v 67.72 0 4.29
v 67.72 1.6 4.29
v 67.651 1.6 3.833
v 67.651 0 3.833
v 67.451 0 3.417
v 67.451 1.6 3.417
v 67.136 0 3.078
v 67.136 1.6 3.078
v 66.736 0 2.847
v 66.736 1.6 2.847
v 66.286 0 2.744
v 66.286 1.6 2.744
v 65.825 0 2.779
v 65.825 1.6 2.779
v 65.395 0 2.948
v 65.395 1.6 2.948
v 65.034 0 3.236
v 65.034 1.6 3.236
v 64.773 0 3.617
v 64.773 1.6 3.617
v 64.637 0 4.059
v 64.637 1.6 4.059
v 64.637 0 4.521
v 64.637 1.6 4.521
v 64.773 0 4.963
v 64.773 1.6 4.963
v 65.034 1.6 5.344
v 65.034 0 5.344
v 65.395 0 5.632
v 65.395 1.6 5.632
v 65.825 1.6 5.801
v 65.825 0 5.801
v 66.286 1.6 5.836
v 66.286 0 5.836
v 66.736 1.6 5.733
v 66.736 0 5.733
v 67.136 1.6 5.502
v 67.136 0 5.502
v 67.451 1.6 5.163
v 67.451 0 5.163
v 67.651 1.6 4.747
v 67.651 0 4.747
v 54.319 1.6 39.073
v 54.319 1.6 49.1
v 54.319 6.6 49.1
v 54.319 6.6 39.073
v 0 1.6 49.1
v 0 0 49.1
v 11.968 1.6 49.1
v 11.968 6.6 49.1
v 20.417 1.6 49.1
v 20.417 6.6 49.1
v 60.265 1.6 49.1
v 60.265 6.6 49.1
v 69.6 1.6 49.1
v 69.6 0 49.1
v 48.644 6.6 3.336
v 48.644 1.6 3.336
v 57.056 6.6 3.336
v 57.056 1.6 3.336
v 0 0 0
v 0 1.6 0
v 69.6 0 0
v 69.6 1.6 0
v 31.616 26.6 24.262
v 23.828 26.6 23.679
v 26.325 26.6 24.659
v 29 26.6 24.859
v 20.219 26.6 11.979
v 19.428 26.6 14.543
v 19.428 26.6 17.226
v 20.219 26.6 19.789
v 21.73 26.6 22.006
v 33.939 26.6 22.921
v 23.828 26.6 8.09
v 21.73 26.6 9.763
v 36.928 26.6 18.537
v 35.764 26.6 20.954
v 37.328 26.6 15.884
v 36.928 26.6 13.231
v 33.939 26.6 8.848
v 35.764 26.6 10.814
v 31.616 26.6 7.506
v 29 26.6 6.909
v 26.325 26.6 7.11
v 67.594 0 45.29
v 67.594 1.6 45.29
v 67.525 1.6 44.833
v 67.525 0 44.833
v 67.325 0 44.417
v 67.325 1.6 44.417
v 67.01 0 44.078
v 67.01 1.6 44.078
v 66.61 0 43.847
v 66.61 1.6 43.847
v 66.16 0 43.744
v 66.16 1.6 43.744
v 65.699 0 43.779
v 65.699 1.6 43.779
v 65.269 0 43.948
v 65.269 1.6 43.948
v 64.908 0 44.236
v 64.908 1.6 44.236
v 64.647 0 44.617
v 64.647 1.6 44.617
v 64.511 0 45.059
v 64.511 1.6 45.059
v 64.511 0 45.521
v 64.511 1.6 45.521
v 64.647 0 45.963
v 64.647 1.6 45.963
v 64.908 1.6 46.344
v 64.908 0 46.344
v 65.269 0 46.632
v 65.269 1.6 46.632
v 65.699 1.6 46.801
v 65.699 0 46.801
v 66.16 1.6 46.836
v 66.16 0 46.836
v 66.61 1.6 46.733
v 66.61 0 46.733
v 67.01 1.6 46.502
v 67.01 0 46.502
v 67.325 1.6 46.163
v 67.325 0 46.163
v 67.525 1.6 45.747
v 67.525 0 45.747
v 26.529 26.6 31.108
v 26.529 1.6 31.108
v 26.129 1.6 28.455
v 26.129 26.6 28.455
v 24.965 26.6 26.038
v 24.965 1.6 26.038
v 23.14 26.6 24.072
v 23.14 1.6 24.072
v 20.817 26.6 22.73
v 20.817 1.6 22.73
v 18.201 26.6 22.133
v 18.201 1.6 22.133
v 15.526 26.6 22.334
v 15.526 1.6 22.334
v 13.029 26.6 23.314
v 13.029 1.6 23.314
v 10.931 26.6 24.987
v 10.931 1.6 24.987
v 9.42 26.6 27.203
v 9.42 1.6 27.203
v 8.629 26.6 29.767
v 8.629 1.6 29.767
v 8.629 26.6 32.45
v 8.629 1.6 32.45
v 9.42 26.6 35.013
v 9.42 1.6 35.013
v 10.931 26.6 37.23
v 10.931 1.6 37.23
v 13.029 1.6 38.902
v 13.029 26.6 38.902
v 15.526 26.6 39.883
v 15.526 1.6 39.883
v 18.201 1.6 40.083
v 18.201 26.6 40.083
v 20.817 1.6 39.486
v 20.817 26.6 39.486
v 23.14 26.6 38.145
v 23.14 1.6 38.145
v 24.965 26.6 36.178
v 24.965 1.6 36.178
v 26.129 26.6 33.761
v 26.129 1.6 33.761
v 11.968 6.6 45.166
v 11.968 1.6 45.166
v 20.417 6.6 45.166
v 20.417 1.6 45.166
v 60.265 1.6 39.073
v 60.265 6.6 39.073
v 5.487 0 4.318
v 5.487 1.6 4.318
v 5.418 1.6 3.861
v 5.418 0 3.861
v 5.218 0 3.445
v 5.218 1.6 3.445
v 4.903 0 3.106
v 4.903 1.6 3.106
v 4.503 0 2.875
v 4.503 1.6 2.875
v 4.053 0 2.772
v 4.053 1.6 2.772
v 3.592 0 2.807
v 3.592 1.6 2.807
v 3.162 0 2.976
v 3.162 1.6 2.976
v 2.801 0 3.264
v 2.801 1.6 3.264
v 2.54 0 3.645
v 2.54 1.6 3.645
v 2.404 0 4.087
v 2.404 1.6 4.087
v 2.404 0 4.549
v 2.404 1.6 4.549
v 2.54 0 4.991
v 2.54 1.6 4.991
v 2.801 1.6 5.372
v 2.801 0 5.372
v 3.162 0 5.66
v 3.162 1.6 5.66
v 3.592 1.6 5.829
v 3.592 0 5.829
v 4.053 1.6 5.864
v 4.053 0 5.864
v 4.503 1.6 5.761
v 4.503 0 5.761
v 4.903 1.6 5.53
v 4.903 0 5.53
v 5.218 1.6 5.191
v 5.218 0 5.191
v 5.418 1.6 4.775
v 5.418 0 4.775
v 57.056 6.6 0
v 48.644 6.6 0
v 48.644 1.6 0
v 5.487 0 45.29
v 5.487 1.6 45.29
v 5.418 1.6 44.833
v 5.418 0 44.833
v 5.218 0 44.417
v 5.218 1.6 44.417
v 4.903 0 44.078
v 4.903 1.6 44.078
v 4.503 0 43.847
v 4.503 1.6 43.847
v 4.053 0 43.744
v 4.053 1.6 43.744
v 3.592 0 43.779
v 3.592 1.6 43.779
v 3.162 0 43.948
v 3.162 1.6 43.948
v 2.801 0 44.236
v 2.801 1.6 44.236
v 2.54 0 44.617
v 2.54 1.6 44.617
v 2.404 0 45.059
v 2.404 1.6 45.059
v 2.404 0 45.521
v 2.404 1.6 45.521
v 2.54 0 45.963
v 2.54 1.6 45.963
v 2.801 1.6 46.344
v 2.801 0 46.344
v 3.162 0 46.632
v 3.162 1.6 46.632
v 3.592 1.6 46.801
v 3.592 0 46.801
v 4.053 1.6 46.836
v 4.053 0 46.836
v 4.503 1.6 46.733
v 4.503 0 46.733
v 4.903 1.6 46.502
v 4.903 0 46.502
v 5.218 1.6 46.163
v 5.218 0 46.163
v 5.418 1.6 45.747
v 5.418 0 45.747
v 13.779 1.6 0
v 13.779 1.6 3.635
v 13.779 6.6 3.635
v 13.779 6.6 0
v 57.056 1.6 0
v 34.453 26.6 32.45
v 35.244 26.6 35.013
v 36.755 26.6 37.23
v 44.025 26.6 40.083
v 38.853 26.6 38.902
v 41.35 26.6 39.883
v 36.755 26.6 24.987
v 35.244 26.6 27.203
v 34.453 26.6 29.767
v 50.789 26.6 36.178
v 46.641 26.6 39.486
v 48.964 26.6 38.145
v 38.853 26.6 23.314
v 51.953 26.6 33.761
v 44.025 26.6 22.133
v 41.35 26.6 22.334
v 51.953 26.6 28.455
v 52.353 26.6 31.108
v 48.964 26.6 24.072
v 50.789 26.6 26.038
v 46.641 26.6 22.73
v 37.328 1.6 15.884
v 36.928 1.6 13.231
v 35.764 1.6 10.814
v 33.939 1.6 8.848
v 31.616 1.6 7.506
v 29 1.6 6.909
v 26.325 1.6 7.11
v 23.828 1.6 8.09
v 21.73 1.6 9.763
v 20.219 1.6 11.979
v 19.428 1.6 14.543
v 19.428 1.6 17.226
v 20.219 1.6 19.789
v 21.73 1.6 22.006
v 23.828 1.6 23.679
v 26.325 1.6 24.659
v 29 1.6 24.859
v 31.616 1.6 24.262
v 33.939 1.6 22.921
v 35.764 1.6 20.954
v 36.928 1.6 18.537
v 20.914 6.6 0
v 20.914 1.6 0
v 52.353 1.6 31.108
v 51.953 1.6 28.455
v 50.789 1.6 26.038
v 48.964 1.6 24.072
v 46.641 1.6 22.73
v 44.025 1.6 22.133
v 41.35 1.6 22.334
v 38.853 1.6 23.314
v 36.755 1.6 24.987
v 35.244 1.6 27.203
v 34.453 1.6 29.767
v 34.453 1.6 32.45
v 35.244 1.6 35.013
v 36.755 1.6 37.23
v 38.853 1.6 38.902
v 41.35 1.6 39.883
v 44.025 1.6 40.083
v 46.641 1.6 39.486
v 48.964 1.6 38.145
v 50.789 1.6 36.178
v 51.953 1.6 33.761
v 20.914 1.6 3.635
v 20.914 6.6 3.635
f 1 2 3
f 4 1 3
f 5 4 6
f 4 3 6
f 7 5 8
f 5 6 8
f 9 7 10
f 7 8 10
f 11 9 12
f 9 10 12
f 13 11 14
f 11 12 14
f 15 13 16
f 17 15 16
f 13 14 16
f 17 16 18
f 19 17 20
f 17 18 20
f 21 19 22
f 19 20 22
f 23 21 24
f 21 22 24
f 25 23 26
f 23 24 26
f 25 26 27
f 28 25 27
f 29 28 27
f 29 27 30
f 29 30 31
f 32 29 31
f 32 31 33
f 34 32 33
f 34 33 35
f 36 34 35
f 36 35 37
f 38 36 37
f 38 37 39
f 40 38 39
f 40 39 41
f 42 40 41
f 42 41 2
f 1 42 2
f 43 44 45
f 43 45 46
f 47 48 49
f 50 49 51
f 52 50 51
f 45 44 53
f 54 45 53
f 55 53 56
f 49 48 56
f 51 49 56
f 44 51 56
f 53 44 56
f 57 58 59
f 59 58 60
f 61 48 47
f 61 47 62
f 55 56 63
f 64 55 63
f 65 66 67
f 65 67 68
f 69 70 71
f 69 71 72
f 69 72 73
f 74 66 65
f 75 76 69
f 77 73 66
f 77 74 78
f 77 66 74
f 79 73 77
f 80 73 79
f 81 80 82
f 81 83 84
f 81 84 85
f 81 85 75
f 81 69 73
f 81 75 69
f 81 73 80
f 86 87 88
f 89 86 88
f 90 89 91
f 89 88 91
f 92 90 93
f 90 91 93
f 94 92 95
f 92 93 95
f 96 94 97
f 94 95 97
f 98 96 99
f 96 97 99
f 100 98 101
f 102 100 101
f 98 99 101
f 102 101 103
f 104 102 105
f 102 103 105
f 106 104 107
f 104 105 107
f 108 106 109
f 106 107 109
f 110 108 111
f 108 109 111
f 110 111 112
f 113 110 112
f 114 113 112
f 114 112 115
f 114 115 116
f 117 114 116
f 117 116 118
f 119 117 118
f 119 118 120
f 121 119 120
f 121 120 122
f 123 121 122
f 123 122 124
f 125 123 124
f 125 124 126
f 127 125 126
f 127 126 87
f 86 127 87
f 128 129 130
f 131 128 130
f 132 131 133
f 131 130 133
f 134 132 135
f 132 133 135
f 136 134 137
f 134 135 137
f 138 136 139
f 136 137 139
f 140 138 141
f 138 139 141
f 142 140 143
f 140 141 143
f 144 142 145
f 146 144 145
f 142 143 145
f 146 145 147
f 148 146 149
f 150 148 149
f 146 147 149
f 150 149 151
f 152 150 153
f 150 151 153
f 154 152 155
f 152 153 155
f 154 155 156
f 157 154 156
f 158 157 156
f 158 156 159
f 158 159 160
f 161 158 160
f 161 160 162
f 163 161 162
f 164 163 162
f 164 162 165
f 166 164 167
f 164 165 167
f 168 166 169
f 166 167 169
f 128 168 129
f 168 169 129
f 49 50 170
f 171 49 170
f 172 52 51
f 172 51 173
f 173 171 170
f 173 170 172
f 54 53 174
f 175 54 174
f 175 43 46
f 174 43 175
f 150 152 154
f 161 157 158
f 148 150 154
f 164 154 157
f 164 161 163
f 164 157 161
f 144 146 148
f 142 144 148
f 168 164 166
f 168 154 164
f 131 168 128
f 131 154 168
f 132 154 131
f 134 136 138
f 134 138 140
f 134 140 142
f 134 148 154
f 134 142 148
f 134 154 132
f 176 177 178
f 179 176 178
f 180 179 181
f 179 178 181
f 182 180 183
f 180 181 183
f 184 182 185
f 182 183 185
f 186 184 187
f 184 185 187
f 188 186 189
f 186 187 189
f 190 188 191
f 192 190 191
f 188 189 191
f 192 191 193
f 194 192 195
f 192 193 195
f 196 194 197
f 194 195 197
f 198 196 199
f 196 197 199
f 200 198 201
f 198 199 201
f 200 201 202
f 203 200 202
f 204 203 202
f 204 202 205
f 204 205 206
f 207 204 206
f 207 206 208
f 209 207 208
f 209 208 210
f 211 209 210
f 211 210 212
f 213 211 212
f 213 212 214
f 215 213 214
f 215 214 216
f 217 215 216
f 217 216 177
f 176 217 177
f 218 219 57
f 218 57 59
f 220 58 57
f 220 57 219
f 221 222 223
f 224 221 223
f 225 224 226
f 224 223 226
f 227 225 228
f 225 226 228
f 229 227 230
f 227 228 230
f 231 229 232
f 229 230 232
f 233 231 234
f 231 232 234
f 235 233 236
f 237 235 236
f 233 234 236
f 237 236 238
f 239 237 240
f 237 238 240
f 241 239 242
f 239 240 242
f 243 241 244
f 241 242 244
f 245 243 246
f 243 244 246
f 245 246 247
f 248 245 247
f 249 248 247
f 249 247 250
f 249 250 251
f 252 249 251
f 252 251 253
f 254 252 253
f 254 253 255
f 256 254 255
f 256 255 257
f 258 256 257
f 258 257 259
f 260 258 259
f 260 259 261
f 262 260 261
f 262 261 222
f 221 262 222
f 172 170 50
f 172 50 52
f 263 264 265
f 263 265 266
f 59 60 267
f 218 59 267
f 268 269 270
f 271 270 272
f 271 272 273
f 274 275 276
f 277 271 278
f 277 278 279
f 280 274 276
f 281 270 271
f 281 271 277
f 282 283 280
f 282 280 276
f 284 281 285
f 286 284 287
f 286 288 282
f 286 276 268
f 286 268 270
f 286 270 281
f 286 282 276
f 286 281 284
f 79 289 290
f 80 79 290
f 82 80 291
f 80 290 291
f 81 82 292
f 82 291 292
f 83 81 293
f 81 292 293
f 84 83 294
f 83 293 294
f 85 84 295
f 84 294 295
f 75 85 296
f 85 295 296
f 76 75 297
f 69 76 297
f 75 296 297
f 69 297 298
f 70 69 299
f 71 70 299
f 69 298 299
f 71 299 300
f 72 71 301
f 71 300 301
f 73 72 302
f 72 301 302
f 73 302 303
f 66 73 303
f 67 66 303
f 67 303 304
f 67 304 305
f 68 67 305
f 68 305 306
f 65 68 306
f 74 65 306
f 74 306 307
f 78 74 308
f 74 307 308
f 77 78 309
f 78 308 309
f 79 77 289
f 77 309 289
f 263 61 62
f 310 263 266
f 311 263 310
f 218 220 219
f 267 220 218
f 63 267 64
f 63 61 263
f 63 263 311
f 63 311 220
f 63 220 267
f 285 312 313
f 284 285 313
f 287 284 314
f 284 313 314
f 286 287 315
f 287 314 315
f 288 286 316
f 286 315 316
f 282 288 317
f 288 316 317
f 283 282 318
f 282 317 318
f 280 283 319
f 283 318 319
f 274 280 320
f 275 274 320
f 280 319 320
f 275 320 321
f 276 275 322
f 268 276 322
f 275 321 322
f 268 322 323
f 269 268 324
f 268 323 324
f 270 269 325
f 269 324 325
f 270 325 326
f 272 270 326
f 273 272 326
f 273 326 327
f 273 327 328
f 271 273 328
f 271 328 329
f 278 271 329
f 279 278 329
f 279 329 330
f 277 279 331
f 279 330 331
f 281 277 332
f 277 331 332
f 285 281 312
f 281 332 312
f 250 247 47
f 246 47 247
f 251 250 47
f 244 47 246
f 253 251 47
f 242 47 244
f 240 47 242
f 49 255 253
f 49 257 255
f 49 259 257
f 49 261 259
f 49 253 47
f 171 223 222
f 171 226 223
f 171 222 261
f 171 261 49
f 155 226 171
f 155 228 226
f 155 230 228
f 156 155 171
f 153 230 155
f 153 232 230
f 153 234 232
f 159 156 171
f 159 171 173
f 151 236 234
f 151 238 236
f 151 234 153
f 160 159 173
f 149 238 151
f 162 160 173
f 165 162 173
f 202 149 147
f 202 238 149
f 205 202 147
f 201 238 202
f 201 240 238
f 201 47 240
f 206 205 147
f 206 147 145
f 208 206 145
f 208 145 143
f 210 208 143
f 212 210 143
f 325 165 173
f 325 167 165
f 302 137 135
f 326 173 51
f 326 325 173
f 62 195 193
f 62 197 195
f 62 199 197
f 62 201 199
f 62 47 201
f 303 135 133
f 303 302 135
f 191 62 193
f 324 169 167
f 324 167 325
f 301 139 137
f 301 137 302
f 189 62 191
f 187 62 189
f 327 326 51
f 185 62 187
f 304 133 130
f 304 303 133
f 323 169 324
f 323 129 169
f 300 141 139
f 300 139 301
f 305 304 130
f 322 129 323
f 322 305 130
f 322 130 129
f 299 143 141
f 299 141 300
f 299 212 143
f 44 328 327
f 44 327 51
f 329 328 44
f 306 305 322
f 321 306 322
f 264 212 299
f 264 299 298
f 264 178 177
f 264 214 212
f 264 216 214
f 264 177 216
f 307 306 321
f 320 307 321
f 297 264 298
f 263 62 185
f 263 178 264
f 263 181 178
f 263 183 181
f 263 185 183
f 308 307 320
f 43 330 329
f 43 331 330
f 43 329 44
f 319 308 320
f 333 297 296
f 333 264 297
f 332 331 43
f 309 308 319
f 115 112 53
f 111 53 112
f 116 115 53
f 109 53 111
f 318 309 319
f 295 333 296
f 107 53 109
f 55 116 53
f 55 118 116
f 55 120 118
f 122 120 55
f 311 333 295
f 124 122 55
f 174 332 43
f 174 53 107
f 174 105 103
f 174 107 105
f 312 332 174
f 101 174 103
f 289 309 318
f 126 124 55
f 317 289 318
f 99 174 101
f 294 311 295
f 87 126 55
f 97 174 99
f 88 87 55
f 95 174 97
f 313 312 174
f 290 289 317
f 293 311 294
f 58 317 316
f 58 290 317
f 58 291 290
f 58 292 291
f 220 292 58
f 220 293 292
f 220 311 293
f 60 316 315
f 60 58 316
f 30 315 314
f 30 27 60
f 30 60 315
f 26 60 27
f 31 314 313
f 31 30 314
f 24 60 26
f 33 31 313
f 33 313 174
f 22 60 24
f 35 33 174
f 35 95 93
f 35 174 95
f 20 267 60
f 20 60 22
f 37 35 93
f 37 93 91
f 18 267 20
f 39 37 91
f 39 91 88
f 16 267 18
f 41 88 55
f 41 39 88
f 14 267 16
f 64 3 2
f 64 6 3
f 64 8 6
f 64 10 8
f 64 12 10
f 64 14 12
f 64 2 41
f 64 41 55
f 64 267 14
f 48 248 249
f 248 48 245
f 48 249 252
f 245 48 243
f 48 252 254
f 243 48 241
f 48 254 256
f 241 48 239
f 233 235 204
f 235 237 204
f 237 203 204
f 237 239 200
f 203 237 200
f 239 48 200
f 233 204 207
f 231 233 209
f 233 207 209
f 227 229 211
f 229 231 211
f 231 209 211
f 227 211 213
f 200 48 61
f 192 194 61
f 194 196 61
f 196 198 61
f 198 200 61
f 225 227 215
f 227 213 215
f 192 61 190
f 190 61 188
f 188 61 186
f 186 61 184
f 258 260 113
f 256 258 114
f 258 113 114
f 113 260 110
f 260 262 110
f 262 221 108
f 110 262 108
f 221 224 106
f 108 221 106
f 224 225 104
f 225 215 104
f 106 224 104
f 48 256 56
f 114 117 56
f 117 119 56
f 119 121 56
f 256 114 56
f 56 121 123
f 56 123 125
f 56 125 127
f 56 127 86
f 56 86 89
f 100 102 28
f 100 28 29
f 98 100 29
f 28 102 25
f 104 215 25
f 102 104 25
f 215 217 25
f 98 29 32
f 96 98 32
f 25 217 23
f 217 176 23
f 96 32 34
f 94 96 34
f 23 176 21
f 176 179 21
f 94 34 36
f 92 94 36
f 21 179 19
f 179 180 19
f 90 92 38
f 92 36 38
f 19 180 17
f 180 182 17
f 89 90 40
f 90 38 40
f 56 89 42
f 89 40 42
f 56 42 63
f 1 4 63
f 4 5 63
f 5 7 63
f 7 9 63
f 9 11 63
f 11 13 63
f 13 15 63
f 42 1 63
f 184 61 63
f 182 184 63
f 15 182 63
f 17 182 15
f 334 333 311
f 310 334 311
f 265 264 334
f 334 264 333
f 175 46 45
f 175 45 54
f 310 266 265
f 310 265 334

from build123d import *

# Parameters (mm, degrees)
SKETCH1_W           = 69.6
SKETCH1_H           = 49.1
BOSS_EXTRUDE1_DEPTH = 1.6
SKETCH2_R           = 9
BOSS_EXTRUDE2_DEPTH = 25
SKETCH3_R           = 1.55
CUT_EXTRUDE1_DEPTH  = 2.6
SKETCH4_W           = 7.135274134
SKETCH4_H           = 3.634808115
SKETCH4_W_2         = 8.411757442
SKETCH4_H_2         = 3.336029474
SKETCH4_W_3         = 8.448874517
SKETCH4_H_3         = 3.933927867
SKETCH4_W_4         = 5.945259598
SKETCH4_H_4         = 10.026659932
BOSS_EXTRUDE3_DEPTH = 5


with BuildPart() as part:
    # Sketch1 → Boss-Extrude1 (new body)
    with BuildSketch(Plane(origin=(0, 0, 0), x_dir=(1, 0, 0), z_dir=(0, 1, 0))):
        with Locations((34.8, -24.55)):
            Rectangle(SKETCH1_W, SKETCH1_H)
    extrude(amount=BOSS_EXTRUDE1_DEPTH)

    # Sketch2 → Boss-Extrude2 (add)
    with BuildSketch(Plane(origin=(0, 1.6, 0), x_dir=(1, 0, 0), z_dir=(0, 1, 0))):
        with Locations((17.528795591, -31.108165605)):
            Circle(SKETCH2_R)
        with Locations((28.327813128, -15.884294945)):
            Circle(SKETCH2_R)
        with Locations((43.352916856, -31.108165605)):
            Circle(SKETCH2_R)
    extrude(amount=BOSS_EXTRUDE2_DEPTH)

    # Sketch3 → Cut-Extrude1 (cut, through all)
    with BuildSketch(Plane(origin=(0, 1.6, 0), x_dir=(1, 0, 0), z_dir=(0, 1, 0))):
        with Locations((3.937, -4.318)):
            Circle(SKETCH3_R)
        with Locations((66.17, -4.29)):
            Circle(SKETCH3_R)
        with Locations((66.044, -45.29)):
            Circle(SKETCH3_R)
        with Locations((3.937, -45.29)):
            Circle(SKETCH3_R)
    extrude(amount=-CUT_EXTRUDE1_DEPTH, mode=Mode.SUBTRACT)

    # Sketch4 → Boss-Extrude3 (add)
    with BuildSketch(Plane(origin=(0, 1.6, 0), x_dir=(1, 0, 0), z_dir=(0, 1, 0))):
        with Locations((17.346192507, -1.817404058)):
            Rectangle(SKETCH4_W, SKETCH4_H)
        with Locations((52.850279958, -1.668014737)):
            Rectangle(SKETCH4_W_2, SKETCH4_H_2)
        with Locations((16.192473292, -47.133036066)):
            Rectangle(SKETCH4_W_3, SKETCH4_H_3)
        with Locations((57.291981259, -44.086670034)):
            Rectangle(SKETCH4_W_4, SKETCH4_H_4)
    extrude(amount=BOSS_EXTRUDE3_DEPTH)


solid = part.part
